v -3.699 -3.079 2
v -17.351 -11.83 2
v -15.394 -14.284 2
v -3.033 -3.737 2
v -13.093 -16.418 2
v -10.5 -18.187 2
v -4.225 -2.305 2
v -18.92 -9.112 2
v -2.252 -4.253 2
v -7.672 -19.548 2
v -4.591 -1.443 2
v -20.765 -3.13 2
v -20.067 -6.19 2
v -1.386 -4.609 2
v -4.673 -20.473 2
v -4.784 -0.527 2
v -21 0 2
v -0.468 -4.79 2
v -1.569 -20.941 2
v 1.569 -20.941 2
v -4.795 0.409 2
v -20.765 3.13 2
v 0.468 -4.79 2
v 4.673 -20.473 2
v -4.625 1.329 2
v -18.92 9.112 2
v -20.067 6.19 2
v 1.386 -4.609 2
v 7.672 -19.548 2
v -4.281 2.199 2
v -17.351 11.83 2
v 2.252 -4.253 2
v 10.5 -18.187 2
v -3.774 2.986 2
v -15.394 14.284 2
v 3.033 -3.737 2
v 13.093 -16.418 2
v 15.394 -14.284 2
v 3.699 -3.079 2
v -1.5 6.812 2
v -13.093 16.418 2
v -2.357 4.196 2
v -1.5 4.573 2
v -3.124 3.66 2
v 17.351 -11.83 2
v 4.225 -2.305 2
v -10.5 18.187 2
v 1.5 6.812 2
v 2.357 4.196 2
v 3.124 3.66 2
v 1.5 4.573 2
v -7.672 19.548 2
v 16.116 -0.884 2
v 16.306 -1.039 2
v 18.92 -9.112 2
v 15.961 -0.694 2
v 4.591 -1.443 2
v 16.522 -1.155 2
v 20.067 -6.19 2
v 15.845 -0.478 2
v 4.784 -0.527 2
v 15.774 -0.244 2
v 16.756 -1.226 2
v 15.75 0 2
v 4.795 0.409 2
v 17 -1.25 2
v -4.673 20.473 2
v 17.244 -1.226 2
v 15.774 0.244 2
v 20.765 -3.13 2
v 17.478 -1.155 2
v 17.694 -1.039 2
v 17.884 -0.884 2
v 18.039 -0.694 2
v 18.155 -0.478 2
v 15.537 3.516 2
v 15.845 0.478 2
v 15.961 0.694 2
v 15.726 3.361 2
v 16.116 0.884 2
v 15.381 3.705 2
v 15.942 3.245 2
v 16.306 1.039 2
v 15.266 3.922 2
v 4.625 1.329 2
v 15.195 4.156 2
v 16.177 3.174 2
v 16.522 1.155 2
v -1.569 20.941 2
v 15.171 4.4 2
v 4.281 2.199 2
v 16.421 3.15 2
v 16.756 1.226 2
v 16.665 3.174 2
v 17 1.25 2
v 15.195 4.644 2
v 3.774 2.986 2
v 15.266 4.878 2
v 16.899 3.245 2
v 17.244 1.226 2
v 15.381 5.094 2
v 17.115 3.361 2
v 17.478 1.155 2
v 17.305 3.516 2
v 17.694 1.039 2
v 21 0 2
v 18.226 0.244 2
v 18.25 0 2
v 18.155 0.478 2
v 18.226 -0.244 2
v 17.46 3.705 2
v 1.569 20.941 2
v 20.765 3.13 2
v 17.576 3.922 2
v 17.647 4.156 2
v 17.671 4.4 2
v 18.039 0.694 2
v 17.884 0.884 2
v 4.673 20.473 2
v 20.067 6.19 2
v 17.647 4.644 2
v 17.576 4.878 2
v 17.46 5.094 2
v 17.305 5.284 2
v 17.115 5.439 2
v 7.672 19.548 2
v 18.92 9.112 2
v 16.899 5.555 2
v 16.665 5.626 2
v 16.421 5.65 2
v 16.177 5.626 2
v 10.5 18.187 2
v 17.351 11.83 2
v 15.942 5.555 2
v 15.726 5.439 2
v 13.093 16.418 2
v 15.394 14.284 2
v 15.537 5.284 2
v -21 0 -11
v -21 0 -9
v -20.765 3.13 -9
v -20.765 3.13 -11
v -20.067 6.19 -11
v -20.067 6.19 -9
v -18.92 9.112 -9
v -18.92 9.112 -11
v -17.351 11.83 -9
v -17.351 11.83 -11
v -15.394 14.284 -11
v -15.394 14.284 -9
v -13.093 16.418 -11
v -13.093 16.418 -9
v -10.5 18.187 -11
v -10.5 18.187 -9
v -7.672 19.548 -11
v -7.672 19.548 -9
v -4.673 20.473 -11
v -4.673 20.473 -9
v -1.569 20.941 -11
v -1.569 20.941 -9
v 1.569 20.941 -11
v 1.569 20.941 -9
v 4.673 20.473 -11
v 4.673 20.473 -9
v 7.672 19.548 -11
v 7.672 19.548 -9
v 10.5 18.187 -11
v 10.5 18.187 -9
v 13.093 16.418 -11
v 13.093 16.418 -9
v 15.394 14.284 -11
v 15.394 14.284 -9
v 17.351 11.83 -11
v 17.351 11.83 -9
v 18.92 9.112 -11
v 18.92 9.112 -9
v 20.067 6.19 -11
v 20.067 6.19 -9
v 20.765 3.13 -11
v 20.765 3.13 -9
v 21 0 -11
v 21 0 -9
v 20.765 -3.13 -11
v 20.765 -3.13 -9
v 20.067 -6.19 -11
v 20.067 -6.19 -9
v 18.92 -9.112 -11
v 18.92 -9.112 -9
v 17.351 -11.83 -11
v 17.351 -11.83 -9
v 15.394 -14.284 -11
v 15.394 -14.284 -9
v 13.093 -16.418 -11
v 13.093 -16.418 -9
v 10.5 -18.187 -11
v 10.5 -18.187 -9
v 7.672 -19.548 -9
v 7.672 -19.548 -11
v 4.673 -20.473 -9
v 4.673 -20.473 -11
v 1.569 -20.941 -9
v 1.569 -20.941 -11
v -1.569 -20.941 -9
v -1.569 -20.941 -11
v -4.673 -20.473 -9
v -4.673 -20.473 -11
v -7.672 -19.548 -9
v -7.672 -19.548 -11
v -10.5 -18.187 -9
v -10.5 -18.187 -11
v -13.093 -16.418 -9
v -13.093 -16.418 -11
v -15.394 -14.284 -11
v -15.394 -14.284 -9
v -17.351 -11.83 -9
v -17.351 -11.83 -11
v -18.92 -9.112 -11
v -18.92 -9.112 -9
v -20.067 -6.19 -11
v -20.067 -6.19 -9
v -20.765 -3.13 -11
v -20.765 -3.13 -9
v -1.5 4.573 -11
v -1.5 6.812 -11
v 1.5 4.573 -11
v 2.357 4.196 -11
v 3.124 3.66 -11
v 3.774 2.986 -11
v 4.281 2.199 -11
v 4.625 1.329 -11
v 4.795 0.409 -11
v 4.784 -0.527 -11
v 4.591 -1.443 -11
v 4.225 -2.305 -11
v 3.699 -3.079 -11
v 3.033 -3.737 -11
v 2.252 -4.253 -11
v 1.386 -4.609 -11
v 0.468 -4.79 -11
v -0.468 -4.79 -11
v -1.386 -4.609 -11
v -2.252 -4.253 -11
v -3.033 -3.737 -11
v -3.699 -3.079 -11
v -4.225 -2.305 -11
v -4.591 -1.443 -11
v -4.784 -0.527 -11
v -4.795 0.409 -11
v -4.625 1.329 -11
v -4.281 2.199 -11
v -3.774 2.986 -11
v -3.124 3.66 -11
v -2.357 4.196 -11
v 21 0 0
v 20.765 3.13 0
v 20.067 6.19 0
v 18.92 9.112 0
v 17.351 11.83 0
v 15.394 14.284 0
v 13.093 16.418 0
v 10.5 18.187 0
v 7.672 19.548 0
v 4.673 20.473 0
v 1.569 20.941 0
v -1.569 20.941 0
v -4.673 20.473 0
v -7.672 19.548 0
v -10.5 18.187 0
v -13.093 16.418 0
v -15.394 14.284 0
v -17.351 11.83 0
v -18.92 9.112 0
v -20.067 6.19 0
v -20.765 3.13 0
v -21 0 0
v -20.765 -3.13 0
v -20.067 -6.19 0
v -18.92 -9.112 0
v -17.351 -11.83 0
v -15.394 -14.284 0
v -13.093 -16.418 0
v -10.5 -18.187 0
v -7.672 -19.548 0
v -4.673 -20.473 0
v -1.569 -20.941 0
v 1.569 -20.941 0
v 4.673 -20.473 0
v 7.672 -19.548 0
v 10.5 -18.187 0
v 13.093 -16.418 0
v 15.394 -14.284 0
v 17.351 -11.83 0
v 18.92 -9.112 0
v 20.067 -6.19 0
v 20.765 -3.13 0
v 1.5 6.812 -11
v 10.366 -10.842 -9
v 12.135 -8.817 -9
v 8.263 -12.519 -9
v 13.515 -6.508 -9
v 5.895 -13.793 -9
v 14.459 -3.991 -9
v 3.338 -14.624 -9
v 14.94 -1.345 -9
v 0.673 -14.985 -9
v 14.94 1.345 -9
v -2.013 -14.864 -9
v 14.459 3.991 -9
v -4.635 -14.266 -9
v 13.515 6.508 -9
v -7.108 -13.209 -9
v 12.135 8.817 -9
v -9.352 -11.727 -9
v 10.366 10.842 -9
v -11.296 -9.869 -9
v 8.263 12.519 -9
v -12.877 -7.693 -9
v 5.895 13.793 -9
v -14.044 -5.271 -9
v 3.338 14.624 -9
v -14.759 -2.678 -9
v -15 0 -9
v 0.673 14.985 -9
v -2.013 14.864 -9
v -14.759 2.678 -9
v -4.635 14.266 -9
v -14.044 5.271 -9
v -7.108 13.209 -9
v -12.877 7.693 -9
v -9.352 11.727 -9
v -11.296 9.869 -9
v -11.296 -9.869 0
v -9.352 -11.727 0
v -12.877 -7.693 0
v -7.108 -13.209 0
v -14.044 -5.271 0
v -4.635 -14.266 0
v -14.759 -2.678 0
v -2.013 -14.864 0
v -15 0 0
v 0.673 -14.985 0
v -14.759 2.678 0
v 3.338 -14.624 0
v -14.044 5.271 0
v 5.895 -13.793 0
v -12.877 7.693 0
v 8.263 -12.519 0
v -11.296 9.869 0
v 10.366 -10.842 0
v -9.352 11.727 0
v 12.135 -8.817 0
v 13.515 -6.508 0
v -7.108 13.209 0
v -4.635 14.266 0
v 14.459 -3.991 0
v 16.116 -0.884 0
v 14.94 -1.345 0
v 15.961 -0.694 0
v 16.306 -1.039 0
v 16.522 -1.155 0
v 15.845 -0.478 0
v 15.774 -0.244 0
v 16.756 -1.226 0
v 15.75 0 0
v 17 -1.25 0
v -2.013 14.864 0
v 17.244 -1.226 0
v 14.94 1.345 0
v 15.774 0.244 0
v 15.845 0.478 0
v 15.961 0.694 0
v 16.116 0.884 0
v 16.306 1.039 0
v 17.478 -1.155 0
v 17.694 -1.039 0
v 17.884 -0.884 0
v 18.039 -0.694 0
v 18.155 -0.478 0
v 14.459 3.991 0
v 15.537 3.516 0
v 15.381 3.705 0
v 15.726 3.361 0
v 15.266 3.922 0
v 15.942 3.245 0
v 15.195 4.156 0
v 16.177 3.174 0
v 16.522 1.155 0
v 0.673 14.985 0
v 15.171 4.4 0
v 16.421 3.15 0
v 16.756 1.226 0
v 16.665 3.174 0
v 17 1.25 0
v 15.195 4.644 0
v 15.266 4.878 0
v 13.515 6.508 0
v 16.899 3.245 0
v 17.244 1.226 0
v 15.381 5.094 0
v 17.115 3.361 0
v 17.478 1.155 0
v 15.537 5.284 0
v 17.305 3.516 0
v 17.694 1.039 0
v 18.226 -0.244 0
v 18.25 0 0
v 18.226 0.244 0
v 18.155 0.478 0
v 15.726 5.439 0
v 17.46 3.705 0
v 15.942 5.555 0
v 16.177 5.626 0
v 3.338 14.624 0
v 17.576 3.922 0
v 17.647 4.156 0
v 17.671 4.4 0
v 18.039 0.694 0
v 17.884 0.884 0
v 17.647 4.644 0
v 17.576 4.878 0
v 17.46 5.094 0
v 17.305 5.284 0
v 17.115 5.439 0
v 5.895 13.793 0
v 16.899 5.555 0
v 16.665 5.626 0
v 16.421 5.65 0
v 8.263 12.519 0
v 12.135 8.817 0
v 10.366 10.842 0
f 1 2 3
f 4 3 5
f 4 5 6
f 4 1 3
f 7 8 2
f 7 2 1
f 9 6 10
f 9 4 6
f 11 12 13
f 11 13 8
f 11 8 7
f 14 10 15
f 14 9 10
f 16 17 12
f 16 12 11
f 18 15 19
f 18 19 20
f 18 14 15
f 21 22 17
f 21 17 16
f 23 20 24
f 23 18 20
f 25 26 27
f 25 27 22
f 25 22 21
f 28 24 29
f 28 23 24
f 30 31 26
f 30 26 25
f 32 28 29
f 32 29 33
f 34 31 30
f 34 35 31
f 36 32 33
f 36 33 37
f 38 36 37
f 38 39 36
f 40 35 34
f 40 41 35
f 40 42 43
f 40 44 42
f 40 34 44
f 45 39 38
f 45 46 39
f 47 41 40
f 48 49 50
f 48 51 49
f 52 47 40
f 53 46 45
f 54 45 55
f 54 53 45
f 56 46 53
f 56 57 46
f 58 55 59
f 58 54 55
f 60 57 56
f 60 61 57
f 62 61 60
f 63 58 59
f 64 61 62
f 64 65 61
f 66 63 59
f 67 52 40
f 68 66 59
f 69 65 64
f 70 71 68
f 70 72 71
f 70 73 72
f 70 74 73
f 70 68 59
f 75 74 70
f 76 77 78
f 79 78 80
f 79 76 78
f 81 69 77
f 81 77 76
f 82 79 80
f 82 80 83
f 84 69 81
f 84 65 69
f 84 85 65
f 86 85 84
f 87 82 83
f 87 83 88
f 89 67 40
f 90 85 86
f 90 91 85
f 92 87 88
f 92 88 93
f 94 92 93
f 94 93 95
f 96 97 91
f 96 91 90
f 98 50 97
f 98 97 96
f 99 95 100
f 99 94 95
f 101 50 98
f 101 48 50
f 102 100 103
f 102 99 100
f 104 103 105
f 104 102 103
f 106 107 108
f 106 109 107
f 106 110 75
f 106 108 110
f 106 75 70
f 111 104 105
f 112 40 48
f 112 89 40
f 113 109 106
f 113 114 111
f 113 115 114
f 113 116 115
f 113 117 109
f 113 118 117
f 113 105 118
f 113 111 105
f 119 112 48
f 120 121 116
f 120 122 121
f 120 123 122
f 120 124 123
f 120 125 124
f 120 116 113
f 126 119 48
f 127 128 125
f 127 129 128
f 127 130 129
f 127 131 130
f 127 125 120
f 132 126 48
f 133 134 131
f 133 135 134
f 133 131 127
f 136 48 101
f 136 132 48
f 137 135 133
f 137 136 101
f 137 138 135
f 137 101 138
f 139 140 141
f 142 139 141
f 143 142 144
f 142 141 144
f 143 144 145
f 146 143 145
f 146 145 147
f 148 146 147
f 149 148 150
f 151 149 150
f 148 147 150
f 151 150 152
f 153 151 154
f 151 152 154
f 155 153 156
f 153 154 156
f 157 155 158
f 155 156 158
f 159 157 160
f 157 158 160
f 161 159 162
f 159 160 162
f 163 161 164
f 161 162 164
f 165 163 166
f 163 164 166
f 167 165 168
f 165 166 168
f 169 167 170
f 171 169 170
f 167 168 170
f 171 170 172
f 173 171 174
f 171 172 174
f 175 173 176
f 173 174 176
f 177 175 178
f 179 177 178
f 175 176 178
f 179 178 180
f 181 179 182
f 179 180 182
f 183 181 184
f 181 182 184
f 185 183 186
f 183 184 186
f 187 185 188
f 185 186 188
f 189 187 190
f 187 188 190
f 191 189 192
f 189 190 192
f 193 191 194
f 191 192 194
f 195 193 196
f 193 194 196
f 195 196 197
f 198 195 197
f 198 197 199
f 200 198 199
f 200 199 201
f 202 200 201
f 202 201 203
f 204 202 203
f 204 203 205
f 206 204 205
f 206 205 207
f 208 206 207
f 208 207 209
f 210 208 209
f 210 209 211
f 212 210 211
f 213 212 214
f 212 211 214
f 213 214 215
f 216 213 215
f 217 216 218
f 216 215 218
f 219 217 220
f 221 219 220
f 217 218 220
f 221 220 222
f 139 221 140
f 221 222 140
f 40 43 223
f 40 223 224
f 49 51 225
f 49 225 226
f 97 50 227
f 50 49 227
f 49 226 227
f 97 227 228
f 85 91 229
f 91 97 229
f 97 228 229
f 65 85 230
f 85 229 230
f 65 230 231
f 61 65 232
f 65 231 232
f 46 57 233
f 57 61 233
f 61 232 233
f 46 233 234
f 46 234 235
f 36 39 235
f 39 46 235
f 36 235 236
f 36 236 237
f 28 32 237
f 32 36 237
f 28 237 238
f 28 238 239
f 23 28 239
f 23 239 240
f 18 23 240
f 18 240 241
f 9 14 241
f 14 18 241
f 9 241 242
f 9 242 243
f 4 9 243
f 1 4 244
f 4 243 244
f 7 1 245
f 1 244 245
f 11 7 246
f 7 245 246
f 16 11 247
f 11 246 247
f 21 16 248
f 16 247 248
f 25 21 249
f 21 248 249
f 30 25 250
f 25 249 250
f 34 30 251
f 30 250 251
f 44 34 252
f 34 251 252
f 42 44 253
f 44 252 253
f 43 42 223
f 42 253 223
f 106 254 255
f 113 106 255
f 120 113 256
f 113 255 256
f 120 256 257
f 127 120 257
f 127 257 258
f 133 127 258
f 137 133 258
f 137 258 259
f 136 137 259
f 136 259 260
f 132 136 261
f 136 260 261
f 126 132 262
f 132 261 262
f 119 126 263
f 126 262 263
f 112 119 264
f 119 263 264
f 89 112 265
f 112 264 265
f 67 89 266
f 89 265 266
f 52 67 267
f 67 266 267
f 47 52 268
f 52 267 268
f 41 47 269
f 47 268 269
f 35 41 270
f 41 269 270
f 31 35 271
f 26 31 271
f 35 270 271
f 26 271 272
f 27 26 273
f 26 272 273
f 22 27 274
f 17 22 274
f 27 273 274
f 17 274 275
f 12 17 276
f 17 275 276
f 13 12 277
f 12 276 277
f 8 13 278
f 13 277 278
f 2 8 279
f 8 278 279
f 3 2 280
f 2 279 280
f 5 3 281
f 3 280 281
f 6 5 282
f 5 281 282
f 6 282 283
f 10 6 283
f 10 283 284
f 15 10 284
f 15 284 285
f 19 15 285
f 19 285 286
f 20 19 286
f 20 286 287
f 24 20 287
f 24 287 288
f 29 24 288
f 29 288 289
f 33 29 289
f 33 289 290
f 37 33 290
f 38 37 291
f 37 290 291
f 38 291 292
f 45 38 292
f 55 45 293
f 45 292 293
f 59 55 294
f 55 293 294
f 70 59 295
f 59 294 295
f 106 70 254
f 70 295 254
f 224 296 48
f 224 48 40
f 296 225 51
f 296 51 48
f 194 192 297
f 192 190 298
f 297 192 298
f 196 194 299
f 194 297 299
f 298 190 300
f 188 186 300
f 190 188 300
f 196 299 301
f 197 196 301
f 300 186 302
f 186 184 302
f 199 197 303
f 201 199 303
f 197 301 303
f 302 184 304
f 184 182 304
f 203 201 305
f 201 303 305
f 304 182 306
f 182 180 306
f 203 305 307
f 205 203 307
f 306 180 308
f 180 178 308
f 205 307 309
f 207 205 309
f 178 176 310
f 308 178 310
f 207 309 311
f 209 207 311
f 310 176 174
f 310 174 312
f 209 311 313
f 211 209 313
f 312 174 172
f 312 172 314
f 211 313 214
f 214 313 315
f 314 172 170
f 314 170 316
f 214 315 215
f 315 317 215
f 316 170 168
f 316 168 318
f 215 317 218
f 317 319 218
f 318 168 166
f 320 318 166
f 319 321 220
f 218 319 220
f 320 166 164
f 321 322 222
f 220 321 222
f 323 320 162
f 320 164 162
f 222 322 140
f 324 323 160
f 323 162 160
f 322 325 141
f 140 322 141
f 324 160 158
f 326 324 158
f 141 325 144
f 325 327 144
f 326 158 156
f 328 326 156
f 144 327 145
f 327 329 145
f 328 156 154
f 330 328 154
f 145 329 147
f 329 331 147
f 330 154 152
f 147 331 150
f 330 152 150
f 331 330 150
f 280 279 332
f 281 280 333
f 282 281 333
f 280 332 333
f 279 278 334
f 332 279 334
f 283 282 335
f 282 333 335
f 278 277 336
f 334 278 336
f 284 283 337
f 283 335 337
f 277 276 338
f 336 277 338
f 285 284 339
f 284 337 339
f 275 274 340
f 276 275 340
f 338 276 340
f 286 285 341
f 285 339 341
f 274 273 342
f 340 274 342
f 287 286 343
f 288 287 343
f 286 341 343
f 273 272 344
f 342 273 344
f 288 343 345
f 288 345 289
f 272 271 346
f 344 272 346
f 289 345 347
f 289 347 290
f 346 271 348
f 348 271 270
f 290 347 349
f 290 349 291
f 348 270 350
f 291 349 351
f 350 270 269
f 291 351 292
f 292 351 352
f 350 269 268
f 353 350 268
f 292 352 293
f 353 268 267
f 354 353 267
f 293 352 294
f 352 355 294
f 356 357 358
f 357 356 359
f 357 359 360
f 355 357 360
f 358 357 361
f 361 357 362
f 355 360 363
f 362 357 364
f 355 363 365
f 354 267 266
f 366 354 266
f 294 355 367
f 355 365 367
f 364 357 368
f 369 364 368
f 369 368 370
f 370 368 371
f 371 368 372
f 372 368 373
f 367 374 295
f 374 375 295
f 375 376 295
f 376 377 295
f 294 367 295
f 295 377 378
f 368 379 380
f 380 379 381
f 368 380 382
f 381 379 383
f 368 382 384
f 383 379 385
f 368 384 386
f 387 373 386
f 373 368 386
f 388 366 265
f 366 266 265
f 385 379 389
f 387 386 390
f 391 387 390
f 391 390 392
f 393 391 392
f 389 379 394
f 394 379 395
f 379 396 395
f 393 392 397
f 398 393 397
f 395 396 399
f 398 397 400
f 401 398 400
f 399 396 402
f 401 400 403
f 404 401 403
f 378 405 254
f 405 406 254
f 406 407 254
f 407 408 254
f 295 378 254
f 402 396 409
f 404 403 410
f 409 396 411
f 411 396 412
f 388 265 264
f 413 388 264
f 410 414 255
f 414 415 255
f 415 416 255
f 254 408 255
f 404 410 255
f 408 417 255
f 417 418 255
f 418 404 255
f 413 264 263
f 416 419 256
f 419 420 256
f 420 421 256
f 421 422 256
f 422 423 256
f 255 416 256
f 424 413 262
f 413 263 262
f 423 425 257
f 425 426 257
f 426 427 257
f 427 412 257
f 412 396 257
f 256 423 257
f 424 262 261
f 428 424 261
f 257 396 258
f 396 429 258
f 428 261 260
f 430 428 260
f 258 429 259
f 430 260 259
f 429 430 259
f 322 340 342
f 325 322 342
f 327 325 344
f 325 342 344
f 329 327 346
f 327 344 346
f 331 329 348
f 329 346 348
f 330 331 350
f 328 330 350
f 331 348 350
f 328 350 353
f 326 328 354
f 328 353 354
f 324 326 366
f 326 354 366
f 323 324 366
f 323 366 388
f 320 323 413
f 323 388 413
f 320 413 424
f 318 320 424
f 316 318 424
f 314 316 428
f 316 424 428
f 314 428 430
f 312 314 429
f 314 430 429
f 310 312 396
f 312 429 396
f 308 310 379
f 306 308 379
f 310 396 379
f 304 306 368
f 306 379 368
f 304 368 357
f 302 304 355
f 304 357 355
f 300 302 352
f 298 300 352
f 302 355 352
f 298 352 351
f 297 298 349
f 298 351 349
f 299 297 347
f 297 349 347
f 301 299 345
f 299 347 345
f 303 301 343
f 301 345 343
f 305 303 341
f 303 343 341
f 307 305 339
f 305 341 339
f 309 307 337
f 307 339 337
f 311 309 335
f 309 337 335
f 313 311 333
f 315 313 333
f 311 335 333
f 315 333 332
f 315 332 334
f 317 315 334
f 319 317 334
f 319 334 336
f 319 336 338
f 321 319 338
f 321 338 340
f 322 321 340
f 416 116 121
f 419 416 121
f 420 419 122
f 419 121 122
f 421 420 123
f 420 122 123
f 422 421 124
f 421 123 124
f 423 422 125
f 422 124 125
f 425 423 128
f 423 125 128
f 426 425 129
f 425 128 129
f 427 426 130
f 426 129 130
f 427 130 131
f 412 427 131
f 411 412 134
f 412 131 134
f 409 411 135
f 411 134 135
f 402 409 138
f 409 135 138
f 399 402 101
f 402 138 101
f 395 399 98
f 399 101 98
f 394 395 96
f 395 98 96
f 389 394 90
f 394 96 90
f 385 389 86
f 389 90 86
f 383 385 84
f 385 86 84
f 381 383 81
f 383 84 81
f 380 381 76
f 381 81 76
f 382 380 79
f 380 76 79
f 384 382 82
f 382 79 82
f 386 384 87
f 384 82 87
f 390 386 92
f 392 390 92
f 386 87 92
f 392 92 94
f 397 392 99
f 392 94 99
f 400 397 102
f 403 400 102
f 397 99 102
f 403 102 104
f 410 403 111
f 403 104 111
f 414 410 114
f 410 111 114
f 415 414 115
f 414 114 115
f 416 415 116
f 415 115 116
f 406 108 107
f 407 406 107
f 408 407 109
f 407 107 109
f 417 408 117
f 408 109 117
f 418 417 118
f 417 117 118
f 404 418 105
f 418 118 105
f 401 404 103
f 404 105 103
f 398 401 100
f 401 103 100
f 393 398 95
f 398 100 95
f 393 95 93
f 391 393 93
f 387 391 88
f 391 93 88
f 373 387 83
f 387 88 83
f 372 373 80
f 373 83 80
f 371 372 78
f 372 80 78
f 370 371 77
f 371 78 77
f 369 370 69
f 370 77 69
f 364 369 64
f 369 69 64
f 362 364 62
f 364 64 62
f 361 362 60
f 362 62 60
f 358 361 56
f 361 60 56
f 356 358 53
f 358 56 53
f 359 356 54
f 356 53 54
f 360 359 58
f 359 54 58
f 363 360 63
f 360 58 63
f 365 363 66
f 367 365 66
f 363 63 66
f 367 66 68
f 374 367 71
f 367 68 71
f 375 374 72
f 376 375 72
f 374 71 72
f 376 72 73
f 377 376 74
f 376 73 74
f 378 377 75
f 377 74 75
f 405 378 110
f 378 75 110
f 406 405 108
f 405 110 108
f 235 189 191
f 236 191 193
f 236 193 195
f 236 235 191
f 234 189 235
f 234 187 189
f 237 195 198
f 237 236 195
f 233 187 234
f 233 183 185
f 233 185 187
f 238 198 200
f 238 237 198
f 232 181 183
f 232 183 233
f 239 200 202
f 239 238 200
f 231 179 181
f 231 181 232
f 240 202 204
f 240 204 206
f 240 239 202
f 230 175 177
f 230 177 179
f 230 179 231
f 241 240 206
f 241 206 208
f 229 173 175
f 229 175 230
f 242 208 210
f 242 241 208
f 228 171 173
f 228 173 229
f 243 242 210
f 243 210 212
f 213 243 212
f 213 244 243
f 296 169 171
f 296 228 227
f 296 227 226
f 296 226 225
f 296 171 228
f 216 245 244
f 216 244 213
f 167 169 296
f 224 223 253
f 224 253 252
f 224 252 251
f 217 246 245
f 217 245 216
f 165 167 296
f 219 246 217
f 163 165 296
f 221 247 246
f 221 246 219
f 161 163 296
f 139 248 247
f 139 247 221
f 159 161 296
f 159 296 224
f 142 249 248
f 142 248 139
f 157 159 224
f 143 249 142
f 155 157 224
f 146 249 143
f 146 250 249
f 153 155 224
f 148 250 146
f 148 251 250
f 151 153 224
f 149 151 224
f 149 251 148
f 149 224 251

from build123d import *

# Parameters (mm, degrees)
SKETCH1_R       = 21
SIDE_1_DEPTH    = 2
SKETCH2_R       = 15
PULLEY_DEPTH    = 9
SKETCH3_R       = 21
SIDE_2_DEPTH    = 2
SKETCH4_R       = 4.8125
SHAFTHOLE_DEPTH = 13
SKETCH5_W       = 3
SKETCH5_H       = 4
KEYWAY_DEPTH    = 13
SKETCH6_R       = 1.25
CABLEHOLE_DEPTH = 2


with BuildPart() as part:
    # Sketch1 → Side 1 (new body)
    with BuildSketch(Plane.XY):
        Circle(SKETCH1_R)
    extrude(amount=SIDE_1_DEPTH)

    # Sketch2 → Pulley (add)
    with BuildSketch(Plane(origin=(0, 0, 0), x_dir=(-1, 0, 0), z_dir=(0, 0, -1))):
        Circle(SKETCH2_R)
    extrude(amount=PULLEY_DEPTH)

    # Sketch3 → Side 2 (add)
    with BuildSketch(Plane(origin=(0, 0, -9), x_dir=(-1, 0, 0), z_dir=(0, 0, -1))):
        Circle(SKETCH3_R)
    extrude(amount=SIDE_2_DEPTH)

    # Sketch4 → ShaftHole (cut)
    with BuildSketch(Plane(origin=(0, 0, -11), x_dir=(-1, 0, 0), z_dir=(0, 0, -1))):
        Circle(SKETCH4_R)
    extrude(amount=-SHAFTHOLE_DEPTH, mode=Mode.SUBTRACT)

    # Sketch5 → KeyWay (cut)
    with BuildSketch(Plane(origin=(0, 0, -11), x_dir=(-1, 0, 0), z_dir=(0, 0, -1))):
        with Locations((0, 4.8125)):
            Rectangle(SKETCH5_W, SKETCH5_H)
    extrude(amount=-KEYWAY_DEPTH, mode=Mode.SUBTRACT)

    # Sketch6 → CableHole (cut)
    with BuildSketch(Plane.XY.offset(2)):
        with Locations((17, 0)):
            Circle(SKETCH6_R)
        with Locations((16.420739047, 4.399923767)):
            Circle(SKETCH6_R)
    extrude(amount=-CABLEHOLE_DEPTH, mode=Mode.SUBTRACT)


solid = part.part
